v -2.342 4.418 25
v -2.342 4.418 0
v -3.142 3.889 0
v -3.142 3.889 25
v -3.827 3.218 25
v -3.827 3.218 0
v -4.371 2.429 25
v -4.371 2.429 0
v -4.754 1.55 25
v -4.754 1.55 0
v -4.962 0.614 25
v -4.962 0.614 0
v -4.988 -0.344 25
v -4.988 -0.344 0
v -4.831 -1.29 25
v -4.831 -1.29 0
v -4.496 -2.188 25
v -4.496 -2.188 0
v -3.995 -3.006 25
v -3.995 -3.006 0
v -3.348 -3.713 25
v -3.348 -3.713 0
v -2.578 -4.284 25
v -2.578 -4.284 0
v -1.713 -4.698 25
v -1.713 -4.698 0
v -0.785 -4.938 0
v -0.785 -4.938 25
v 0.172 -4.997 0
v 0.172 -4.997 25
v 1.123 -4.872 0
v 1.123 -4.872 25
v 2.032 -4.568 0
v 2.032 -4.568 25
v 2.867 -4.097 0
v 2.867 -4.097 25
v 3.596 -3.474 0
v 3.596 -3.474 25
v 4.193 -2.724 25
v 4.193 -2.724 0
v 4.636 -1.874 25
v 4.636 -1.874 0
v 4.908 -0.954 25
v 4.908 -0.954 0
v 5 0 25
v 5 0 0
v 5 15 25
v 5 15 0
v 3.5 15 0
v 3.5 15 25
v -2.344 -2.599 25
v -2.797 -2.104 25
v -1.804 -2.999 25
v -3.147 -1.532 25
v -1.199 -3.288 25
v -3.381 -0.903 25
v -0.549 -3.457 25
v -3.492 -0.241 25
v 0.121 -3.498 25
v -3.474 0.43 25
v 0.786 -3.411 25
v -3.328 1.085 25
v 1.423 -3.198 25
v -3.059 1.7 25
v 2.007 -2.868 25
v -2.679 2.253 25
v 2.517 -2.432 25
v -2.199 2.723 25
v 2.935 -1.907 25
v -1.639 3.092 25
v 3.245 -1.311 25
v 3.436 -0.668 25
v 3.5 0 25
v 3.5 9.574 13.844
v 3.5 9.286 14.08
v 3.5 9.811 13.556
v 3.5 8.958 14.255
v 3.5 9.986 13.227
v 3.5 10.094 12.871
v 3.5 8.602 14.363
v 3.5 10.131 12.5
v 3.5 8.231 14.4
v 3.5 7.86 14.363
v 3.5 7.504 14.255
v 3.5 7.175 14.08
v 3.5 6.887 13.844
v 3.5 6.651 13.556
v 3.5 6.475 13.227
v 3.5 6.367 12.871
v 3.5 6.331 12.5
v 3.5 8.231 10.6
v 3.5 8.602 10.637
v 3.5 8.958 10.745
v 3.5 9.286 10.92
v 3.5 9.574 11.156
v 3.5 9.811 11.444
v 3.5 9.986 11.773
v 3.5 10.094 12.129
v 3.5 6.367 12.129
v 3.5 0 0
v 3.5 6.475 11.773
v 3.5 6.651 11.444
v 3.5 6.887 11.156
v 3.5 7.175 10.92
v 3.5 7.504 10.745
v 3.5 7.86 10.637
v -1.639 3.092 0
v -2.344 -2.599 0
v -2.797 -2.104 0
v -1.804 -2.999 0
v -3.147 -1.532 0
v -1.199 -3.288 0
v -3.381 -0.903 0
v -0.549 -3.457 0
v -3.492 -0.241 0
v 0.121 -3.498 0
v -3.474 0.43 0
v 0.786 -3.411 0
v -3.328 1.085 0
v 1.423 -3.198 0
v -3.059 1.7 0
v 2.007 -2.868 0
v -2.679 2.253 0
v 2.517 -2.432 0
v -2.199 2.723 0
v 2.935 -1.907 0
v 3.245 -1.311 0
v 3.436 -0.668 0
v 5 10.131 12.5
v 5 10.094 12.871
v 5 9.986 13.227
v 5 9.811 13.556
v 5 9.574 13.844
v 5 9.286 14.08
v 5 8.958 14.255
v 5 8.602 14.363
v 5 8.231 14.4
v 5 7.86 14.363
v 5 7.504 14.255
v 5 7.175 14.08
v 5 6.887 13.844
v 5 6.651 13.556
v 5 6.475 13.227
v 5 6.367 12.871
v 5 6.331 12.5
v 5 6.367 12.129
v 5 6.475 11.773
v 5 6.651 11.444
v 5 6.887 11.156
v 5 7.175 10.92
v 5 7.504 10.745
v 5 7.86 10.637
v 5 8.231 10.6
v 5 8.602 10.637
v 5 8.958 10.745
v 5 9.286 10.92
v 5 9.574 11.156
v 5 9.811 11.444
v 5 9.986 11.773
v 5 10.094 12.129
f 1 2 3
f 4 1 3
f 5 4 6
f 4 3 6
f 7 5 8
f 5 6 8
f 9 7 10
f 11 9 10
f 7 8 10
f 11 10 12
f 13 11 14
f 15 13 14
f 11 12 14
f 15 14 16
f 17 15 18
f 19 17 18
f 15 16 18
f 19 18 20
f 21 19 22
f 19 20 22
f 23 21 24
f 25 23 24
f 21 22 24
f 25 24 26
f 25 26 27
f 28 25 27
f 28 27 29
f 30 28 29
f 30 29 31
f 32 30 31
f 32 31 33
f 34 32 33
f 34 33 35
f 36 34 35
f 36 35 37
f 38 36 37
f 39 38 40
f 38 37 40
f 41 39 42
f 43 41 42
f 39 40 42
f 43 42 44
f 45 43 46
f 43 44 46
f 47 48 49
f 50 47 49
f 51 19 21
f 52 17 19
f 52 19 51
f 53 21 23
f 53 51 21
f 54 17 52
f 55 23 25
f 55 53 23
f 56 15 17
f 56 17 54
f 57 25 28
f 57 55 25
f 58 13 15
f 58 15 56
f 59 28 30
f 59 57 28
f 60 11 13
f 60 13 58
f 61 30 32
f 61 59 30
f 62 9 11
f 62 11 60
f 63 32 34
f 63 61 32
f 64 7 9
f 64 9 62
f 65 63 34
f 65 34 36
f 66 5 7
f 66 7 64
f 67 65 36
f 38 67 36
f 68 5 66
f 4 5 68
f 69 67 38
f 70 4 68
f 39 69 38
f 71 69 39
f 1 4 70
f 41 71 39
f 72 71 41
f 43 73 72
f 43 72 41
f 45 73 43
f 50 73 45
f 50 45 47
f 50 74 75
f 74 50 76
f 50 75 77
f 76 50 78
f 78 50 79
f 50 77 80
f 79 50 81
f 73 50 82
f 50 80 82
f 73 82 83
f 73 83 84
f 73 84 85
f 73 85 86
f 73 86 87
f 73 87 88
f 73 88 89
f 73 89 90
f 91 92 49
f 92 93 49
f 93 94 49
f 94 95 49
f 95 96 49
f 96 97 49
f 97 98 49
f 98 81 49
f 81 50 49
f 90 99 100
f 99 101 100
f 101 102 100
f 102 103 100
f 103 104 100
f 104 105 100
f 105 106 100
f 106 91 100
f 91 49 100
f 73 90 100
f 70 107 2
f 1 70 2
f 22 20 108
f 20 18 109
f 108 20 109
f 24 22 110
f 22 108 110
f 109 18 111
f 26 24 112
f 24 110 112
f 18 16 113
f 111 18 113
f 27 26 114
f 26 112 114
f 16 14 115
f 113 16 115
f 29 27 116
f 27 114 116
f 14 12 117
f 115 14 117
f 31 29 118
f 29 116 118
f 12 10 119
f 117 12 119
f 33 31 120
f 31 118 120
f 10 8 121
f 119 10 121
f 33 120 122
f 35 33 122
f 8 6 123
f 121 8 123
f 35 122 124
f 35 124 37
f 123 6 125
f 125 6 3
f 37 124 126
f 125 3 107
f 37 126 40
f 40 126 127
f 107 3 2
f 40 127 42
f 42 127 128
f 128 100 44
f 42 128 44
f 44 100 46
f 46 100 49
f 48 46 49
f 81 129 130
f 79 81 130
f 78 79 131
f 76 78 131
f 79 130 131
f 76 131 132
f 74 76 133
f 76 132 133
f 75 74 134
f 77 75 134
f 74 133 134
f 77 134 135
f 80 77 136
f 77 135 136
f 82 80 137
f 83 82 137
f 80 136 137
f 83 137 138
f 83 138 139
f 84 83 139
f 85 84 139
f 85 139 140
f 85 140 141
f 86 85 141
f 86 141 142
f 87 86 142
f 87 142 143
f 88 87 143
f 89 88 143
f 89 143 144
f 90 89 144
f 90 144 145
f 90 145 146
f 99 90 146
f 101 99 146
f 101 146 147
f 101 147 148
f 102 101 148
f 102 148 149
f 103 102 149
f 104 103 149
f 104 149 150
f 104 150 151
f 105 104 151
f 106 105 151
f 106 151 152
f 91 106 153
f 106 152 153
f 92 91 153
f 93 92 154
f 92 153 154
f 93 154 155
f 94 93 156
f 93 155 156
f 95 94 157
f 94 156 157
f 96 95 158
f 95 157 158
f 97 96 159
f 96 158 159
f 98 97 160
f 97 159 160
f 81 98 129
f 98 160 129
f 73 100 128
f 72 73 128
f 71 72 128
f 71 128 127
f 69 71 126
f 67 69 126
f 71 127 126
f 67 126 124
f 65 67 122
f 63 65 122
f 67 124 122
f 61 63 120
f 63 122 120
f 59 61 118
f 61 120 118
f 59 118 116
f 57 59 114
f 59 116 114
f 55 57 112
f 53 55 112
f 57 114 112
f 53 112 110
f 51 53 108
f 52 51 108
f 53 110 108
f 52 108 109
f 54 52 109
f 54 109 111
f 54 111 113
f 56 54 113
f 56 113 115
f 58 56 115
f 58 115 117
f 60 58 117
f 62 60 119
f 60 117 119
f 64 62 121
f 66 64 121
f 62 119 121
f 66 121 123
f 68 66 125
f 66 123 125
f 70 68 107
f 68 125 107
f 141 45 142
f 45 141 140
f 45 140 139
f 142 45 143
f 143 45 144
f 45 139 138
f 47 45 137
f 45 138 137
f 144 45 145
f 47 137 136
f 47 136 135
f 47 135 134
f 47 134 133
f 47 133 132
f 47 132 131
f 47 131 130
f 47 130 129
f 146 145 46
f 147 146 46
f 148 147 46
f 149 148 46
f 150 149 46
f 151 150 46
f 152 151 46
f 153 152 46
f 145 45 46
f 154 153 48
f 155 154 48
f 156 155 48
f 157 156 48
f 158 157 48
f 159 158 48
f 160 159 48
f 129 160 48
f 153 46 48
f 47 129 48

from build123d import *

# Parameters (mm, degrees)
F1_DEPTH = 25
F3_D     = 3.8
F3_DEPTH = 20


with BuildPart() as f1:
    # F0 (on Top) → F1 (new body)
    with BuildSketch(Plane.XY):
        with BuildLine():
            ThreePointArc((3.5, 0), (-1.804479, -2.998976), (-1.639346, 3.092337))
            Line((-1.639346, 3.092337), (-2.341922, 4.417624))
            ThreePointArc((-2.341922, 4.417624), (-2.577827, -4.284251), (5, 0))
            Line((5, 0), (5, 15))
            Line((5, 15), (3.5, 15))
            Line((3.5, 15), (3.5, 0))
        make_face()
    extrude(amount=F1_DEPTH)

    # F3
    with Locations(Plane(origin=(3.5, 0, 0), x_dir=(0, -1, 0), z_dir=(-1, 0, 0))):
        with Locations((-8.230869, 12.5)):
            Hole(F3_D / 2, depth=F3_DEPTH)


solid = f1.part
